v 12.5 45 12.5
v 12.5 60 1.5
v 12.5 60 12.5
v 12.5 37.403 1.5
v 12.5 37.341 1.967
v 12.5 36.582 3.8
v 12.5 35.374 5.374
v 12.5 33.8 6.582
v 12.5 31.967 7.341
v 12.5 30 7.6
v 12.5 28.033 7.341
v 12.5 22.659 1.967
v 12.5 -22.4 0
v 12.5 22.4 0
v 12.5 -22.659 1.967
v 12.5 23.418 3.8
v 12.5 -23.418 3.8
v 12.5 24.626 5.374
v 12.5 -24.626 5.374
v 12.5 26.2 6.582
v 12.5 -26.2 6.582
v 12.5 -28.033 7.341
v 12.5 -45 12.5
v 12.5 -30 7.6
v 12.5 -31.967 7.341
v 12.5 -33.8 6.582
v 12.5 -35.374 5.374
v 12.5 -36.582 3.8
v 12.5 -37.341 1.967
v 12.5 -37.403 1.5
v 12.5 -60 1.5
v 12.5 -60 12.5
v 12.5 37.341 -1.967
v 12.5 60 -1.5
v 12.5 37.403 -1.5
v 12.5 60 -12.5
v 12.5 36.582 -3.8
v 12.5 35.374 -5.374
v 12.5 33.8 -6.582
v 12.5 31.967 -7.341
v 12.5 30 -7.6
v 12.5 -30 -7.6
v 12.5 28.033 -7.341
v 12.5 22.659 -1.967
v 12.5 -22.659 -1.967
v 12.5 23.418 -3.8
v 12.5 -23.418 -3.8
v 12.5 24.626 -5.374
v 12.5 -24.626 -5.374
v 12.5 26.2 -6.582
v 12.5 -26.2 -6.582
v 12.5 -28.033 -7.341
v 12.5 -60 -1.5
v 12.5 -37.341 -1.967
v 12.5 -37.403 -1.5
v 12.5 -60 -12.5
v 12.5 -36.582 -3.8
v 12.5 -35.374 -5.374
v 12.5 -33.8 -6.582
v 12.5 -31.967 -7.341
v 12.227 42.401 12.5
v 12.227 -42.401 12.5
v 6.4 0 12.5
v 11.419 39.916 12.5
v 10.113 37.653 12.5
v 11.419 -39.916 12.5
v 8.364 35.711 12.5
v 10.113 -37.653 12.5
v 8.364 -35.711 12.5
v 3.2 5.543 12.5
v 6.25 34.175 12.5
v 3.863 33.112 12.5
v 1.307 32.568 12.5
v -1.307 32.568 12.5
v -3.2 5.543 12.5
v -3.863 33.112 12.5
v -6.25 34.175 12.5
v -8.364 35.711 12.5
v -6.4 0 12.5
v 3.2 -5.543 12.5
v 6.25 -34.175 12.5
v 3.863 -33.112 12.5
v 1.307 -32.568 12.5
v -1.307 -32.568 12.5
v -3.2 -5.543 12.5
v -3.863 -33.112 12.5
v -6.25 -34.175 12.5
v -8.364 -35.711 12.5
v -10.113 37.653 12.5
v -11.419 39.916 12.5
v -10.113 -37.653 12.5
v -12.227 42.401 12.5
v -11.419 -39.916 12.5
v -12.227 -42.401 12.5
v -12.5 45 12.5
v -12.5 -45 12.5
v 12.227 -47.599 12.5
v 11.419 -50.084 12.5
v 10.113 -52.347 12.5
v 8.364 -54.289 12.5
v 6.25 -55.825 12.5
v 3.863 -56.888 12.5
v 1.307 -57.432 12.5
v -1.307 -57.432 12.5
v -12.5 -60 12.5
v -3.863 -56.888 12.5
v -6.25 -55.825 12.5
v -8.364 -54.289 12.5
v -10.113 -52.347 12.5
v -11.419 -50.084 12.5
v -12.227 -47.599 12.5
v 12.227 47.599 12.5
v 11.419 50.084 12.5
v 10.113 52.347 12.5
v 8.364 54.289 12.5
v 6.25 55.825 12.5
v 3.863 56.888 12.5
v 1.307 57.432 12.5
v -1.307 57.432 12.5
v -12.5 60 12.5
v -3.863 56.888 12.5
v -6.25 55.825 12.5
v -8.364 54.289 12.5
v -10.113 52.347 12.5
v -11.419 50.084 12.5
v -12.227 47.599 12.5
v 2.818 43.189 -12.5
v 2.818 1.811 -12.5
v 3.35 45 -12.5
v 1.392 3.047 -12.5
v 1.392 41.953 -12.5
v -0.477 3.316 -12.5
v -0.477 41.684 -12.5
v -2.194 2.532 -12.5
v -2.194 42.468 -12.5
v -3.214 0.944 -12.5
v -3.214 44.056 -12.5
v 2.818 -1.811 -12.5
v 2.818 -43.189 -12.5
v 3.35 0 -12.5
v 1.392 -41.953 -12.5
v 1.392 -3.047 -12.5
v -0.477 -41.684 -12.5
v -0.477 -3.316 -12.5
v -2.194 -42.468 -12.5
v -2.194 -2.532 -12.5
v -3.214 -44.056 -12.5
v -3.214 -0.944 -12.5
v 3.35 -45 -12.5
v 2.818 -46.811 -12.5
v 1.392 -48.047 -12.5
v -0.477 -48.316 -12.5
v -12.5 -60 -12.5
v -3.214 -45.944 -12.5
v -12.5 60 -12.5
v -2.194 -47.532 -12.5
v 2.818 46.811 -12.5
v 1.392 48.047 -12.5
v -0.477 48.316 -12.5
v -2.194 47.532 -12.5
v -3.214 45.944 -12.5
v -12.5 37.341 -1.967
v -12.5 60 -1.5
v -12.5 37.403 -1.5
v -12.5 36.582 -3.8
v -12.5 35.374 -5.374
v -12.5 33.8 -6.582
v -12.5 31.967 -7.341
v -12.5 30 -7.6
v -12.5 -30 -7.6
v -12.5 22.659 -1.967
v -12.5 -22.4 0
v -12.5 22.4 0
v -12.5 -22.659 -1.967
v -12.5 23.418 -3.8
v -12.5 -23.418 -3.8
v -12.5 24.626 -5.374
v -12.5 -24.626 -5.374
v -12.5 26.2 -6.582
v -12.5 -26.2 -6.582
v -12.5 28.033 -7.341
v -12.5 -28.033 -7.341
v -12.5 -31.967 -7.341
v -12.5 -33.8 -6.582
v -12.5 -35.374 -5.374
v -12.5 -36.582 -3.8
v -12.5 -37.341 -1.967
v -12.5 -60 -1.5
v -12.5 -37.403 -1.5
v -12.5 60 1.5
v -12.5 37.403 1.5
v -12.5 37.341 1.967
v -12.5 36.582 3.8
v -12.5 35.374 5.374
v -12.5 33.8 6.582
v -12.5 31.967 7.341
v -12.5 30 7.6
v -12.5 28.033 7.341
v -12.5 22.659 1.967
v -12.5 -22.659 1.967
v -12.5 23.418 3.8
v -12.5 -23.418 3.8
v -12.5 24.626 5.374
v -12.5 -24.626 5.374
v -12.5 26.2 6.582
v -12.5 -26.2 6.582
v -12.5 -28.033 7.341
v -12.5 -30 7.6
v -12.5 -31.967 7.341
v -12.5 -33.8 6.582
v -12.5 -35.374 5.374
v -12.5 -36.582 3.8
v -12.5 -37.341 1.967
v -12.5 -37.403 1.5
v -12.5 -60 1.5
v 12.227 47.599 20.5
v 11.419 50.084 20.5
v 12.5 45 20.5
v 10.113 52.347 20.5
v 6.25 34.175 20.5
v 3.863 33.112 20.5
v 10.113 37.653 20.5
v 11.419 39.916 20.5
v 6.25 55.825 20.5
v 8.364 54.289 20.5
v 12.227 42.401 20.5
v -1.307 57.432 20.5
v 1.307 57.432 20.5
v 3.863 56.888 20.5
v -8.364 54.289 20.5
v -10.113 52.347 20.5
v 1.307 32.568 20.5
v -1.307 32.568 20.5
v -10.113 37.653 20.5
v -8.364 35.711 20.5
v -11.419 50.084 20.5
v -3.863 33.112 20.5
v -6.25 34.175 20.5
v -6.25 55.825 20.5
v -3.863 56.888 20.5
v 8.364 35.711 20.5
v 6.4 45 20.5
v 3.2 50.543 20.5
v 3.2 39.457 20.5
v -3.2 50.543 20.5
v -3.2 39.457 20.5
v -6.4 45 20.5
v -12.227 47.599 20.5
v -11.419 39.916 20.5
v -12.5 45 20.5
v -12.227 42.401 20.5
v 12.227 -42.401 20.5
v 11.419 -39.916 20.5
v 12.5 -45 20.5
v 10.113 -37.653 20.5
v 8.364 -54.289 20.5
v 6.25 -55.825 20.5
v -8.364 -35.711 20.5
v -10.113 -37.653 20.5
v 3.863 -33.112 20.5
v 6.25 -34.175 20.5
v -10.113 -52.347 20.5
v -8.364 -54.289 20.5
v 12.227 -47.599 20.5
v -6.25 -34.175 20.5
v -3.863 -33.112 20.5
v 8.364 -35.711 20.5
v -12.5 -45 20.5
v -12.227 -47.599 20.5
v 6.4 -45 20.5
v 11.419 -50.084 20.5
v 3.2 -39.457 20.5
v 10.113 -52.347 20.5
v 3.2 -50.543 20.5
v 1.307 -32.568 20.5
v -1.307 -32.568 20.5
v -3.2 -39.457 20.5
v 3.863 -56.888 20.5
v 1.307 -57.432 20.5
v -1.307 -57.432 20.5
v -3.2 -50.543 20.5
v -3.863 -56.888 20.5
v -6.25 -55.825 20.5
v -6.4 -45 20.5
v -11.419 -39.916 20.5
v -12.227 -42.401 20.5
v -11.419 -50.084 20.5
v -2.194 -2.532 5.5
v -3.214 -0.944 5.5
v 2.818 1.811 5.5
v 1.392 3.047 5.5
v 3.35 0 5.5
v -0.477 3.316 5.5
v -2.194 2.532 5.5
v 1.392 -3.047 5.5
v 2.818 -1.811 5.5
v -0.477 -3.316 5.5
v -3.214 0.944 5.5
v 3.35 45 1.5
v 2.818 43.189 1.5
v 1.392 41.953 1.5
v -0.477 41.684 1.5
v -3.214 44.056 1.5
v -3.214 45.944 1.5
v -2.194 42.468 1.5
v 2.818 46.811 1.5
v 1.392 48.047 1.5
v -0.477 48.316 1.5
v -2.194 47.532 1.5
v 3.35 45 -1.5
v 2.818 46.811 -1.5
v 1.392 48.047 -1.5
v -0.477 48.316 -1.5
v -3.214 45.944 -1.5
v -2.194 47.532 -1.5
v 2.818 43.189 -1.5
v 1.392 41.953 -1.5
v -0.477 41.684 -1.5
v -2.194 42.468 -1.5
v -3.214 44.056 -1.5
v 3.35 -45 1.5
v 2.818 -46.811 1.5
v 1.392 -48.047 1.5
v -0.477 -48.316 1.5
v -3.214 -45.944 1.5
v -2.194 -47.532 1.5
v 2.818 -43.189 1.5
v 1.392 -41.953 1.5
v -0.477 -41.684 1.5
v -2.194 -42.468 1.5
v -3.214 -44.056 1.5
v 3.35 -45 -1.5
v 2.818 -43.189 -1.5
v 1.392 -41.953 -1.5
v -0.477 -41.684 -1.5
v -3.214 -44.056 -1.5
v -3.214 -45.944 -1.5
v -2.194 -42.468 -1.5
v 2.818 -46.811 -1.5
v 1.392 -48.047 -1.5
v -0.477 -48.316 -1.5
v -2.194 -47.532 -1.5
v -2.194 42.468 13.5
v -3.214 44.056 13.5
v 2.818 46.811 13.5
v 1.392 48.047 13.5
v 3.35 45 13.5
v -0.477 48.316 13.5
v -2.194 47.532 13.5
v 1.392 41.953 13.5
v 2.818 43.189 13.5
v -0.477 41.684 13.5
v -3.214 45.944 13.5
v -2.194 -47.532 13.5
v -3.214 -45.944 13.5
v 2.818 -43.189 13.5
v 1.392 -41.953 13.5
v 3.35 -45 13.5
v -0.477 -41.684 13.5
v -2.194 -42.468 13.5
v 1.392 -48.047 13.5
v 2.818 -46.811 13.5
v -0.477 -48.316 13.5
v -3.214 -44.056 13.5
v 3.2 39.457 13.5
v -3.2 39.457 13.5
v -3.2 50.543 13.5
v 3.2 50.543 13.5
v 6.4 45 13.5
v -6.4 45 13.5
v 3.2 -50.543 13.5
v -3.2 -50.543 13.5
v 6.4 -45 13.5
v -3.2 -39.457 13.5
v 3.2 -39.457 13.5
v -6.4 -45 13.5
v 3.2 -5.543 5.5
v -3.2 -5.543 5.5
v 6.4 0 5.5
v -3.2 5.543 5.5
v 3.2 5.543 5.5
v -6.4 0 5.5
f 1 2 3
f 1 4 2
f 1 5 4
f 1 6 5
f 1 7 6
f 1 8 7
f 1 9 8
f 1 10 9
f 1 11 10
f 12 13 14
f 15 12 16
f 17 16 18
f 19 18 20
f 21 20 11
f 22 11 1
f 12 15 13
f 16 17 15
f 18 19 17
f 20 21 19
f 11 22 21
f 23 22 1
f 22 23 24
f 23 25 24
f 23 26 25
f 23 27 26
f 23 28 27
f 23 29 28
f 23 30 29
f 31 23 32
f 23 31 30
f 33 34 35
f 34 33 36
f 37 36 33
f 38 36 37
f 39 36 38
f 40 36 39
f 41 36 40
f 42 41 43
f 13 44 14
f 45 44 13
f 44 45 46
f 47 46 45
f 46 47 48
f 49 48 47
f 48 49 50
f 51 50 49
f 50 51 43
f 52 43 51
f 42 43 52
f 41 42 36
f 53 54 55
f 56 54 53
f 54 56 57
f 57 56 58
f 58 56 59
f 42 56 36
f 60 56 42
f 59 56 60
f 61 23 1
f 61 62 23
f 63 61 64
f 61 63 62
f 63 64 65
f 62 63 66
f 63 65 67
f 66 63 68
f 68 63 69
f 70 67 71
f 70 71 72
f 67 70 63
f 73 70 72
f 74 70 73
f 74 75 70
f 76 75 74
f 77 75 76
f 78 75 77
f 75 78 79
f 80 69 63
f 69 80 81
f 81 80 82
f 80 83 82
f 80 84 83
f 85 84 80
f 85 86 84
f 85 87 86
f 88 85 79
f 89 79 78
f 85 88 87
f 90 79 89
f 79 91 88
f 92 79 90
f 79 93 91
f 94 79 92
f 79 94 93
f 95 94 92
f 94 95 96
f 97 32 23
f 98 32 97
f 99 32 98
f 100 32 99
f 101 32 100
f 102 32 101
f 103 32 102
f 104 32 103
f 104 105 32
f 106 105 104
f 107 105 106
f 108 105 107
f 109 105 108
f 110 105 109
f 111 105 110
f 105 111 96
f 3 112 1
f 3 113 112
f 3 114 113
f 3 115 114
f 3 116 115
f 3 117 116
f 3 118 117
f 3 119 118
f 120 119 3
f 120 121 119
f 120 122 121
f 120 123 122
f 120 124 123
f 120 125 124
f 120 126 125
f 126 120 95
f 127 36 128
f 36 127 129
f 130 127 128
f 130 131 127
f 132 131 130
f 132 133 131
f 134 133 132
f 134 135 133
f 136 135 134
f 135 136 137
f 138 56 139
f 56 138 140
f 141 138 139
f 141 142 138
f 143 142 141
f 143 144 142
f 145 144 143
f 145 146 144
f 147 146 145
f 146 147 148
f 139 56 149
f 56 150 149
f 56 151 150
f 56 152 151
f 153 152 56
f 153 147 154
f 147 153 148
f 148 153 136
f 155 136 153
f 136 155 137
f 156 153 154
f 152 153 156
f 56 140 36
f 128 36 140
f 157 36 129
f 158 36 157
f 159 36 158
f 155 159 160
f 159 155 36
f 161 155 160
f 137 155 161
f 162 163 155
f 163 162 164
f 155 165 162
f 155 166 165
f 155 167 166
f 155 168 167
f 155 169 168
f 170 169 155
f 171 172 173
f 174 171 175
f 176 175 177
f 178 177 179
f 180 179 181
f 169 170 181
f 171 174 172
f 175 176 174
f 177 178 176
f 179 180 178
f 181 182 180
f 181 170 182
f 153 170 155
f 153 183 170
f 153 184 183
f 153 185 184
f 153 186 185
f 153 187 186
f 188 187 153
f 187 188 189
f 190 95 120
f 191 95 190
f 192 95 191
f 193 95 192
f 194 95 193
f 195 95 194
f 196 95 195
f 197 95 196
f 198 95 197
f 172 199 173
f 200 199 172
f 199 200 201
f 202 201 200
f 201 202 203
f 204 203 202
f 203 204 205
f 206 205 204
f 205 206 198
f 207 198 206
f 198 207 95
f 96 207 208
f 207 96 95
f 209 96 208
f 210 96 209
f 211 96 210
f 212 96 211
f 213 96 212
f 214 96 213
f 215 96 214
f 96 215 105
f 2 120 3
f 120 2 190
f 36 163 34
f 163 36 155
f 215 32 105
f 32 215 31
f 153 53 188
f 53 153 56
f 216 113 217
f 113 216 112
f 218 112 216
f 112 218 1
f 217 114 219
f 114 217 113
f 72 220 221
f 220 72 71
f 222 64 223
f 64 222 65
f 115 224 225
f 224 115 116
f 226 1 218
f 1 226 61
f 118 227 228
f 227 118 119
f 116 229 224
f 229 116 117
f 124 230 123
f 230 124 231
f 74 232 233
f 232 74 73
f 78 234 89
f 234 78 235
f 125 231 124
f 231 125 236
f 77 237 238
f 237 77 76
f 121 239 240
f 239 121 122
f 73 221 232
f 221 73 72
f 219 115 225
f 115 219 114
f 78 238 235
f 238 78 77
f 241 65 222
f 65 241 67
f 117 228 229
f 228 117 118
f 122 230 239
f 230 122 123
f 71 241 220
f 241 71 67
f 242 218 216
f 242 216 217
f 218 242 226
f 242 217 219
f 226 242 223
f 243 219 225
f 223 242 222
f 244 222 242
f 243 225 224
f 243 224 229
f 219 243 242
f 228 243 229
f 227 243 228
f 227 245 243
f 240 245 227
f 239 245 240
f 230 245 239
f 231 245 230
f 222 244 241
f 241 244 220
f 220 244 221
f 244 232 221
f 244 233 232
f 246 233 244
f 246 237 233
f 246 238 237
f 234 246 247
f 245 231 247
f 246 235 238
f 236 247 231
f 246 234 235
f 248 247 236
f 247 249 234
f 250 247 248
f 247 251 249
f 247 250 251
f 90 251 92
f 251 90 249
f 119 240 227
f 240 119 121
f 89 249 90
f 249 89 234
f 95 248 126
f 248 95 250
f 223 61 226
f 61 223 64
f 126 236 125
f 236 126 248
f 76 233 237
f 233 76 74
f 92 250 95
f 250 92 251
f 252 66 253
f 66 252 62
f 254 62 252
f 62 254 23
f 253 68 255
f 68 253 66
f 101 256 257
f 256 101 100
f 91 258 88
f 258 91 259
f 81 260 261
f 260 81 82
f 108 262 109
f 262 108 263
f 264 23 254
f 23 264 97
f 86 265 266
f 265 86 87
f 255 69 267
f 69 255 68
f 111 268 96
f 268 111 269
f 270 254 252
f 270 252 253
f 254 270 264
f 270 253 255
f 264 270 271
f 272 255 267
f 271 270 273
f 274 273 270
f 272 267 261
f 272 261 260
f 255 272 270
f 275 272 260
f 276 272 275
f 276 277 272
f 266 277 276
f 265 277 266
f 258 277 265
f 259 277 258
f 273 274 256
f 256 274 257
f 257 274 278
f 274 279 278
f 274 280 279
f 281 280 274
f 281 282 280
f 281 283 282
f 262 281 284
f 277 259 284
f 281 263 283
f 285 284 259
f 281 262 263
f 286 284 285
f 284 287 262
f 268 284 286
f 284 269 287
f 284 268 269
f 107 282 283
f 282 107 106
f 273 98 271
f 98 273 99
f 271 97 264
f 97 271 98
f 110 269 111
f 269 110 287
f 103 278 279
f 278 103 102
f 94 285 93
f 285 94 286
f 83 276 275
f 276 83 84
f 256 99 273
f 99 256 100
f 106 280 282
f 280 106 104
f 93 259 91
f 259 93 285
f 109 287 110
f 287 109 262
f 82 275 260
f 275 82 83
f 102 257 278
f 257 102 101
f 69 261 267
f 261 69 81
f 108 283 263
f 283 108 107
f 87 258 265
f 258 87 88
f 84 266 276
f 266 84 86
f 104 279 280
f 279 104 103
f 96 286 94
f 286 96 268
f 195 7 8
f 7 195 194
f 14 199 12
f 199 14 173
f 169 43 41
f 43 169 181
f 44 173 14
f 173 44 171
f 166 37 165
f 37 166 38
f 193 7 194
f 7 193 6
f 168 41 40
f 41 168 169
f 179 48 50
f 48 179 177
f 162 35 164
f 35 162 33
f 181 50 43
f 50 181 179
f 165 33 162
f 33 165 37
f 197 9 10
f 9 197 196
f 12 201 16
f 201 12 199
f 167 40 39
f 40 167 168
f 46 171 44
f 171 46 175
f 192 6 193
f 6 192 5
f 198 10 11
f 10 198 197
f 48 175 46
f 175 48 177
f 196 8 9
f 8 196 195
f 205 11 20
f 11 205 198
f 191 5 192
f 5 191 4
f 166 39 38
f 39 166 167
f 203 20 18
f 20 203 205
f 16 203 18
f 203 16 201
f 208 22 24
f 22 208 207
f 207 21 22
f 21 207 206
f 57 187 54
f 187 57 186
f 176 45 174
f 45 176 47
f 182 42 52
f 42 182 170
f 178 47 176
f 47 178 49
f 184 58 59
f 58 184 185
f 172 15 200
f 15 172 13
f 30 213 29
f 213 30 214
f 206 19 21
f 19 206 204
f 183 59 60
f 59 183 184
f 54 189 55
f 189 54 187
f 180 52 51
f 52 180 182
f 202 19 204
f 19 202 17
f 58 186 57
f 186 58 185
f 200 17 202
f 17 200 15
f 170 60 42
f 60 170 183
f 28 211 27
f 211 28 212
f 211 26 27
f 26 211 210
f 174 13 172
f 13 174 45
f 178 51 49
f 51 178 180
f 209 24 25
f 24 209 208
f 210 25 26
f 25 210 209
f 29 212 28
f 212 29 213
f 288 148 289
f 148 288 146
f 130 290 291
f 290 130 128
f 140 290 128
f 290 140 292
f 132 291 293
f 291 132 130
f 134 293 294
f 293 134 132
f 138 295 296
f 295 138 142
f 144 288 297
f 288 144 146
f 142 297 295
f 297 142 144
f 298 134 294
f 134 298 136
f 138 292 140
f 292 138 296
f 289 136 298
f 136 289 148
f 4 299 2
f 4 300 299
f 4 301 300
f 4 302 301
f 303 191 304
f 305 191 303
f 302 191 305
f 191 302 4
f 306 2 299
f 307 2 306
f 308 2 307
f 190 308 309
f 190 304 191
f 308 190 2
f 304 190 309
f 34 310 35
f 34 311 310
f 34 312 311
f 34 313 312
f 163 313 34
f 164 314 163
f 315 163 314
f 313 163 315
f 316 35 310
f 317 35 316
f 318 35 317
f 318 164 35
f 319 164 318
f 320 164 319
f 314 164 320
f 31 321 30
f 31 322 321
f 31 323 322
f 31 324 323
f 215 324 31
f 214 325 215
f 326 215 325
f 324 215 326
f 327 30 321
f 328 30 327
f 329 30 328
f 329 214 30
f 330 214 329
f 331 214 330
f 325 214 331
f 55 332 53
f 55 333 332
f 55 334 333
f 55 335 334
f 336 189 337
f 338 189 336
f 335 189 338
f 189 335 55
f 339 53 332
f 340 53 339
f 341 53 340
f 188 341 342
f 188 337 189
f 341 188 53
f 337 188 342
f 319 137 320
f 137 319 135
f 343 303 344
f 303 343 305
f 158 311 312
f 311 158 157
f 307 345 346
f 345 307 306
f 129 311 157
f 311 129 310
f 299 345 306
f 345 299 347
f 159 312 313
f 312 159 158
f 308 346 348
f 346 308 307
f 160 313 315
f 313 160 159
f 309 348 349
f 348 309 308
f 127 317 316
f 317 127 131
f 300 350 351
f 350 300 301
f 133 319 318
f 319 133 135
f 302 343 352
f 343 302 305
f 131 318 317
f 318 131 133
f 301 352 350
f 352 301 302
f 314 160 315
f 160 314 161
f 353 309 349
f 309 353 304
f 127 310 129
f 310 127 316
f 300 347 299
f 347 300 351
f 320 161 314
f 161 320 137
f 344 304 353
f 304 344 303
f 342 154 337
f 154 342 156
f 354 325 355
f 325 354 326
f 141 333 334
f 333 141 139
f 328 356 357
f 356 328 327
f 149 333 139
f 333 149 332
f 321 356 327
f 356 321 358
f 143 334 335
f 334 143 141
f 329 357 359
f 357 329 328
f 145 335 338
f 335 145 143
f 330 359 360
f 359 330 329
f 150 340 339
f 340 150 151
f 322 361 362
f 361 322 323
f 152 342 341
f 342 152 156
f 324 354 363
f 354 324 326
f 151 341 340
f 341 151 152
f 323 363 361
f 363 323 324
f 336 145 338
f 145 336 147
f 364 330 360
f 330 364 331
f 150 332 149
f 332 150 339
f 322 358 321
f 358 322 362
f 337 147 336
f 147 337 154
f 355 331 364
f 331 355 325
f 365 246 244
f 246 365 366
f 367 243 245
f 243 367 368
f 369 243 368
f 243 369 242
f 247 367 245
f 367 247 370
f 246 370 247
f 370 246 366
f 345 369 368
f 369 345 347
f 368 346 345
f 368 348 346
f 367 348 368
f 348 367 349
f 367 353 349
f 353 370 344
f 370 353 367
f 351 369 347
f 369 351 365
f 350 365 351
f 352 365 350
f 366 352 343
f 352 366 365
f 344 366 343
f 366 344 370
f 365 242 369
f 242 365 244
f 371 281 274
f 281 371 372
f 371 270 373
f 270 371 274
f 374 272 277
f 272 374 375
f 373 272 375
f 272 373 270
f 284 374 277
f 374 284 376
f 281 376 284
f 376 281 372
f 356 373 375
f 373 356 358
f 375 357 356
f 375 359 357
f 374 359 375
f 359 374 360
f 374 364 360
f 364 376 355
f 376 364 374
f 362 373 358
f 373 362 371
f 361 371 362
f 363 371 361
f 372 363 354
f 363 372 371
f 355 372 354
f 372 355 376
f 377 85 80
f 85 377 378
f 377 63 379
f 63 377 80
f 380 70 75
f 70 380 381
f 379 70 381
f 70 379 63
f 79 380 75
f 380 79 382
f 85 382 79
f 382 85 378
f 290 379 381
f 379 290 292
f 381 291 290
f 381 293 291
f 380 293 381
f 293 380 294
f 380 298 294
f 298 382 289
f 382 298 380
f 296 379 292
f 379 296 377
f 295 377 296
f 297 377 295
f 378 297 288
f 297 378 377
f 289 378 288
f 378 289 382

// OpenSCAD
// file: ../../../Mobile Studio/15mm rod mount/rod mount.scad
/* Open SCAD Name.: 15mm_rail_sys_v2.scad
*  Copyright (c)..: 2016 www.DIY3DTech.com
*
*  Creation Date..: 12/01/2016
*  Description....:
*
*  Rev 1: Develop Model
*  Rev 2:
*
*  This program is free software; you can redistribute it and/or modify
*  it under the terms of the GNU General Public License as published by
*  the Free Software Foundation; either version 2 of the License, or
*  (at your option) any later version.
*
*  This program is distributed in the hope that it will be useful,
*  but WITHOUT ANY WARRANTY; without even the implied warranty of
*  MERCHANTABILITY or FITNESS FOR A PARTICULAR PURPOSE.  See the
*  GNU General Public License for more details.
*/

/*------------------Customizer View-------------------*/

// preview[view:north, tilt:top]

/*---------------------Parameters---------------------*/

//bar width in mm
bar_y       = 120;
bar_x       = 25;
bar_z       = 25;

//rod diameter
rod_d       = 15.2;
//center to center rod seperation
rod_spread  = 60;

//bolt diameter
bolt_d      = 6.7;

//bolt cap height
cap_height  = 8;
//bolt cap diameter
cap_d       = 12.8;
//cap sides
cap_s       = 6;

//gap to chinch rod
gap         = 3;

/*-----------------------Execute----------------------*/

block_module();

/*-----------------------Modules----------------------*/

module block_module(){ //create module
    difference() {
            union() {//start union
                 translate ([0,0,0]) cube([bar_x,bar_y,bar_z],center=true);

                    //create mounting caps for bolts
                translate ([0,(((bar_y/2)-(rod_spread/2))/2)+(rod_spread/2),(bar_z/2)+(cap_height/2)]) cylinder(cap_height,bar_x/2,bar_x/2, center=true);
                translate ([0,-((((bar_y/2)-(rod_spread/2))/2)+(rod_spread/2)),(bar_z/2)+(cap_height/2)]) cylinder(cap_height,bar_x/2,bar_x/2, center=true);

                    } //end union

    //start subtraction of difference

                //create rod pockets
                translate ([0,rod_spread/2,0]) rotate ([0,90,0]) cylinder(bar_x+3,rod_d/2,rod_d/2, center=true);
                translate ([0,-(rod_spread/2),0]) rotate ([0,90,0]) cylinder(bar_x+3,rod_d/2,rod_d/2, center=true);

                //create 1/4-20 bolt hole
                translate ([0,0,0]) rotate ([0,0,0]) cylinder(bar_x+cap_height+3,bolt_d/2,bolt_d/2, center=true);

                //create strain relief to chinch on rods
                translate ([0,(((bar_y/2)-(rod_spread/2))/2)+(rod_spread/2),0]) cube([bar_x+3,((bar_y/2)-(rod_spread/2)),gap],center=true);

                translate ([0,-((((bar_y/2)-(rod_spread/2))/2)+(rod_spread/2)),0]) cube([bar_x+3,((bar_y/2)-(rod_spread/2)),gap],center=true);

                //create mounting bolt openings
                translate ([0,(((bar_y/2)-(rod_spread/2))/2)+(rod_spread/2),5]) cylinder(bar_x+cap_height+3,bolt_d/2,bolt_d/2, center=true);
                translate ([0,-((((bar_y/2)-(rod_spread/2))/2)+(rod_spread/2)),5]) cylinder(bar_x+cap_height+3,bolt_d/2,bolt_d/2, center=true);

                //create hex cap head recess for mounting bolts
                translate ([0,(((bar_y/2)-(rod_spread/2))/2)+(rod_spread/2),(bar_z/2)+(cap_height/2)+1]) cylinder(cap_height,cap_d/2,cap_d/2,$fn=6, center=true);
                translate ([0,-((((bar_y/2)-(rod_spread/2))/2)+(rod_spread/2)),(bar_z/2)+(cap_height/2)+1]) cylinder(cap_height,cap_d/2,cap_d/2,$fn=6, center=true);

                //create center recess for cap head
                translate ([0,0,((bar_z/2)+1)-(cap_height/2)]) cylinder(cap_height,cap_d/2,cap_d/2,$fn=6, center=true);


    } //end difference
}//end module

/*----------------------End Code----------------------*/
// main file
include <../../../Mobile Studio/15mm rod mount/rod mount.scad>


module rod_module() {//create module
    difference() {
        union() {//start union
            translate([0, 0, 0]) cube([bar_x, bar_y, bar_z], center = true);

            //create mounting caps for bolts
            translate([0, (((bar_y / 2) - (rod_spread / 2)) / 2) + (rod_spread / 2), (bar_z / 2) + (cap_height / 2)])
                cylinder(cap_height, bar_x / 2, bar_x / 2, center = true);
            translate([0, - ((((bar_y / 2) - (rod_spread / 2)) / 2) + (rod_spread / 2)), (bar_z / 2) + (cap_height / 2)]
            ) cylinder(cap_height, bar_x / 2, bar_x / 2, center = true);

        } //end union

        //start subtraction of difference

        //create rod pockets
        translate([0, rod_spread / 2, 0]) rotate([0, 90, 0]) cylinder(bar_x + 3, rod_d / 2, rod_d / 2, center = true);
        translate([0, - (rod_spread / 2), 0]) rotate([0, 90, 0]) cylinder(bar_x + 3, rod_d / 2, rod_d / 2, center = true
        );

        //create 1/4-20 bolt hole
        translate([0, 0, 0]) rotate([0, 0, 0]) cylinder(bar_x + cap_height + 3, bolt_d / 2, bolt_d / 2, center = true);

        //create strain relief to chinch on rods
        translate([0, (((bar_y / 2) - (rod_spread / 2)) / 2) + (rod_spread / 2), 0]) cube([bar_x + 3, ((bar_y / 2) - (
            rod_spread / 2)), gap], center = true);

        translate([0, - ((((bar_y / 2) - (rod_spread / 2)) / 2) + (rod_spread / 2)), 0]) cube([bar_x + 3, ((bar_y / 2) -
            (rod_spread / 2)), gap], center = true);

        //create mounting bolt openings
        translate([0, (((bar_y / 2) - (rod_spread / 2)) / 2) + (rod_spread / 2), 5]) cylinder(bar_x + cap_height + 3,
            bolt_d / 2, bolt_d / 2, center = true);
        translate([0, - ((((bar_y / 2) - (rod_spread / 2)) / 2) + (rod_spread / 2)), 5]) cylinder(bar_x + cap_height + 3
        , bolt_d / 2, bolt_d / 2, center = true);

        //create hex cap head recess for mounting bolts
        translate([0, (((bar_y / 2) - (rod_spread / 2)) / 2) + (rod_spread / 2), (bar_z / 2) + (cap_height / 2) + 1])
            cylinder(cap_height, cap_d / 2, cap_d / 2, $fn = 6, center = true);
        translate([0, - ((((bar_y / 2) - (rod_spread / 2)) / 2) + (rod_spread / 2)), (bar_z / 2) + (cap_height / 2) + 1]
        ) cylinder(cap_height, cap_d / 2, cap_d / 2, $fn = 6, center = true);

        //create center recess for cap head
        translate([0, 0, ((bar_z / 2) + 1) - (cap_height / 2)]) cylinder(cap_height, cap_d / 2, cap_d / 2, $fn = 6,
        center = true);


    } //end difference
}//end module
